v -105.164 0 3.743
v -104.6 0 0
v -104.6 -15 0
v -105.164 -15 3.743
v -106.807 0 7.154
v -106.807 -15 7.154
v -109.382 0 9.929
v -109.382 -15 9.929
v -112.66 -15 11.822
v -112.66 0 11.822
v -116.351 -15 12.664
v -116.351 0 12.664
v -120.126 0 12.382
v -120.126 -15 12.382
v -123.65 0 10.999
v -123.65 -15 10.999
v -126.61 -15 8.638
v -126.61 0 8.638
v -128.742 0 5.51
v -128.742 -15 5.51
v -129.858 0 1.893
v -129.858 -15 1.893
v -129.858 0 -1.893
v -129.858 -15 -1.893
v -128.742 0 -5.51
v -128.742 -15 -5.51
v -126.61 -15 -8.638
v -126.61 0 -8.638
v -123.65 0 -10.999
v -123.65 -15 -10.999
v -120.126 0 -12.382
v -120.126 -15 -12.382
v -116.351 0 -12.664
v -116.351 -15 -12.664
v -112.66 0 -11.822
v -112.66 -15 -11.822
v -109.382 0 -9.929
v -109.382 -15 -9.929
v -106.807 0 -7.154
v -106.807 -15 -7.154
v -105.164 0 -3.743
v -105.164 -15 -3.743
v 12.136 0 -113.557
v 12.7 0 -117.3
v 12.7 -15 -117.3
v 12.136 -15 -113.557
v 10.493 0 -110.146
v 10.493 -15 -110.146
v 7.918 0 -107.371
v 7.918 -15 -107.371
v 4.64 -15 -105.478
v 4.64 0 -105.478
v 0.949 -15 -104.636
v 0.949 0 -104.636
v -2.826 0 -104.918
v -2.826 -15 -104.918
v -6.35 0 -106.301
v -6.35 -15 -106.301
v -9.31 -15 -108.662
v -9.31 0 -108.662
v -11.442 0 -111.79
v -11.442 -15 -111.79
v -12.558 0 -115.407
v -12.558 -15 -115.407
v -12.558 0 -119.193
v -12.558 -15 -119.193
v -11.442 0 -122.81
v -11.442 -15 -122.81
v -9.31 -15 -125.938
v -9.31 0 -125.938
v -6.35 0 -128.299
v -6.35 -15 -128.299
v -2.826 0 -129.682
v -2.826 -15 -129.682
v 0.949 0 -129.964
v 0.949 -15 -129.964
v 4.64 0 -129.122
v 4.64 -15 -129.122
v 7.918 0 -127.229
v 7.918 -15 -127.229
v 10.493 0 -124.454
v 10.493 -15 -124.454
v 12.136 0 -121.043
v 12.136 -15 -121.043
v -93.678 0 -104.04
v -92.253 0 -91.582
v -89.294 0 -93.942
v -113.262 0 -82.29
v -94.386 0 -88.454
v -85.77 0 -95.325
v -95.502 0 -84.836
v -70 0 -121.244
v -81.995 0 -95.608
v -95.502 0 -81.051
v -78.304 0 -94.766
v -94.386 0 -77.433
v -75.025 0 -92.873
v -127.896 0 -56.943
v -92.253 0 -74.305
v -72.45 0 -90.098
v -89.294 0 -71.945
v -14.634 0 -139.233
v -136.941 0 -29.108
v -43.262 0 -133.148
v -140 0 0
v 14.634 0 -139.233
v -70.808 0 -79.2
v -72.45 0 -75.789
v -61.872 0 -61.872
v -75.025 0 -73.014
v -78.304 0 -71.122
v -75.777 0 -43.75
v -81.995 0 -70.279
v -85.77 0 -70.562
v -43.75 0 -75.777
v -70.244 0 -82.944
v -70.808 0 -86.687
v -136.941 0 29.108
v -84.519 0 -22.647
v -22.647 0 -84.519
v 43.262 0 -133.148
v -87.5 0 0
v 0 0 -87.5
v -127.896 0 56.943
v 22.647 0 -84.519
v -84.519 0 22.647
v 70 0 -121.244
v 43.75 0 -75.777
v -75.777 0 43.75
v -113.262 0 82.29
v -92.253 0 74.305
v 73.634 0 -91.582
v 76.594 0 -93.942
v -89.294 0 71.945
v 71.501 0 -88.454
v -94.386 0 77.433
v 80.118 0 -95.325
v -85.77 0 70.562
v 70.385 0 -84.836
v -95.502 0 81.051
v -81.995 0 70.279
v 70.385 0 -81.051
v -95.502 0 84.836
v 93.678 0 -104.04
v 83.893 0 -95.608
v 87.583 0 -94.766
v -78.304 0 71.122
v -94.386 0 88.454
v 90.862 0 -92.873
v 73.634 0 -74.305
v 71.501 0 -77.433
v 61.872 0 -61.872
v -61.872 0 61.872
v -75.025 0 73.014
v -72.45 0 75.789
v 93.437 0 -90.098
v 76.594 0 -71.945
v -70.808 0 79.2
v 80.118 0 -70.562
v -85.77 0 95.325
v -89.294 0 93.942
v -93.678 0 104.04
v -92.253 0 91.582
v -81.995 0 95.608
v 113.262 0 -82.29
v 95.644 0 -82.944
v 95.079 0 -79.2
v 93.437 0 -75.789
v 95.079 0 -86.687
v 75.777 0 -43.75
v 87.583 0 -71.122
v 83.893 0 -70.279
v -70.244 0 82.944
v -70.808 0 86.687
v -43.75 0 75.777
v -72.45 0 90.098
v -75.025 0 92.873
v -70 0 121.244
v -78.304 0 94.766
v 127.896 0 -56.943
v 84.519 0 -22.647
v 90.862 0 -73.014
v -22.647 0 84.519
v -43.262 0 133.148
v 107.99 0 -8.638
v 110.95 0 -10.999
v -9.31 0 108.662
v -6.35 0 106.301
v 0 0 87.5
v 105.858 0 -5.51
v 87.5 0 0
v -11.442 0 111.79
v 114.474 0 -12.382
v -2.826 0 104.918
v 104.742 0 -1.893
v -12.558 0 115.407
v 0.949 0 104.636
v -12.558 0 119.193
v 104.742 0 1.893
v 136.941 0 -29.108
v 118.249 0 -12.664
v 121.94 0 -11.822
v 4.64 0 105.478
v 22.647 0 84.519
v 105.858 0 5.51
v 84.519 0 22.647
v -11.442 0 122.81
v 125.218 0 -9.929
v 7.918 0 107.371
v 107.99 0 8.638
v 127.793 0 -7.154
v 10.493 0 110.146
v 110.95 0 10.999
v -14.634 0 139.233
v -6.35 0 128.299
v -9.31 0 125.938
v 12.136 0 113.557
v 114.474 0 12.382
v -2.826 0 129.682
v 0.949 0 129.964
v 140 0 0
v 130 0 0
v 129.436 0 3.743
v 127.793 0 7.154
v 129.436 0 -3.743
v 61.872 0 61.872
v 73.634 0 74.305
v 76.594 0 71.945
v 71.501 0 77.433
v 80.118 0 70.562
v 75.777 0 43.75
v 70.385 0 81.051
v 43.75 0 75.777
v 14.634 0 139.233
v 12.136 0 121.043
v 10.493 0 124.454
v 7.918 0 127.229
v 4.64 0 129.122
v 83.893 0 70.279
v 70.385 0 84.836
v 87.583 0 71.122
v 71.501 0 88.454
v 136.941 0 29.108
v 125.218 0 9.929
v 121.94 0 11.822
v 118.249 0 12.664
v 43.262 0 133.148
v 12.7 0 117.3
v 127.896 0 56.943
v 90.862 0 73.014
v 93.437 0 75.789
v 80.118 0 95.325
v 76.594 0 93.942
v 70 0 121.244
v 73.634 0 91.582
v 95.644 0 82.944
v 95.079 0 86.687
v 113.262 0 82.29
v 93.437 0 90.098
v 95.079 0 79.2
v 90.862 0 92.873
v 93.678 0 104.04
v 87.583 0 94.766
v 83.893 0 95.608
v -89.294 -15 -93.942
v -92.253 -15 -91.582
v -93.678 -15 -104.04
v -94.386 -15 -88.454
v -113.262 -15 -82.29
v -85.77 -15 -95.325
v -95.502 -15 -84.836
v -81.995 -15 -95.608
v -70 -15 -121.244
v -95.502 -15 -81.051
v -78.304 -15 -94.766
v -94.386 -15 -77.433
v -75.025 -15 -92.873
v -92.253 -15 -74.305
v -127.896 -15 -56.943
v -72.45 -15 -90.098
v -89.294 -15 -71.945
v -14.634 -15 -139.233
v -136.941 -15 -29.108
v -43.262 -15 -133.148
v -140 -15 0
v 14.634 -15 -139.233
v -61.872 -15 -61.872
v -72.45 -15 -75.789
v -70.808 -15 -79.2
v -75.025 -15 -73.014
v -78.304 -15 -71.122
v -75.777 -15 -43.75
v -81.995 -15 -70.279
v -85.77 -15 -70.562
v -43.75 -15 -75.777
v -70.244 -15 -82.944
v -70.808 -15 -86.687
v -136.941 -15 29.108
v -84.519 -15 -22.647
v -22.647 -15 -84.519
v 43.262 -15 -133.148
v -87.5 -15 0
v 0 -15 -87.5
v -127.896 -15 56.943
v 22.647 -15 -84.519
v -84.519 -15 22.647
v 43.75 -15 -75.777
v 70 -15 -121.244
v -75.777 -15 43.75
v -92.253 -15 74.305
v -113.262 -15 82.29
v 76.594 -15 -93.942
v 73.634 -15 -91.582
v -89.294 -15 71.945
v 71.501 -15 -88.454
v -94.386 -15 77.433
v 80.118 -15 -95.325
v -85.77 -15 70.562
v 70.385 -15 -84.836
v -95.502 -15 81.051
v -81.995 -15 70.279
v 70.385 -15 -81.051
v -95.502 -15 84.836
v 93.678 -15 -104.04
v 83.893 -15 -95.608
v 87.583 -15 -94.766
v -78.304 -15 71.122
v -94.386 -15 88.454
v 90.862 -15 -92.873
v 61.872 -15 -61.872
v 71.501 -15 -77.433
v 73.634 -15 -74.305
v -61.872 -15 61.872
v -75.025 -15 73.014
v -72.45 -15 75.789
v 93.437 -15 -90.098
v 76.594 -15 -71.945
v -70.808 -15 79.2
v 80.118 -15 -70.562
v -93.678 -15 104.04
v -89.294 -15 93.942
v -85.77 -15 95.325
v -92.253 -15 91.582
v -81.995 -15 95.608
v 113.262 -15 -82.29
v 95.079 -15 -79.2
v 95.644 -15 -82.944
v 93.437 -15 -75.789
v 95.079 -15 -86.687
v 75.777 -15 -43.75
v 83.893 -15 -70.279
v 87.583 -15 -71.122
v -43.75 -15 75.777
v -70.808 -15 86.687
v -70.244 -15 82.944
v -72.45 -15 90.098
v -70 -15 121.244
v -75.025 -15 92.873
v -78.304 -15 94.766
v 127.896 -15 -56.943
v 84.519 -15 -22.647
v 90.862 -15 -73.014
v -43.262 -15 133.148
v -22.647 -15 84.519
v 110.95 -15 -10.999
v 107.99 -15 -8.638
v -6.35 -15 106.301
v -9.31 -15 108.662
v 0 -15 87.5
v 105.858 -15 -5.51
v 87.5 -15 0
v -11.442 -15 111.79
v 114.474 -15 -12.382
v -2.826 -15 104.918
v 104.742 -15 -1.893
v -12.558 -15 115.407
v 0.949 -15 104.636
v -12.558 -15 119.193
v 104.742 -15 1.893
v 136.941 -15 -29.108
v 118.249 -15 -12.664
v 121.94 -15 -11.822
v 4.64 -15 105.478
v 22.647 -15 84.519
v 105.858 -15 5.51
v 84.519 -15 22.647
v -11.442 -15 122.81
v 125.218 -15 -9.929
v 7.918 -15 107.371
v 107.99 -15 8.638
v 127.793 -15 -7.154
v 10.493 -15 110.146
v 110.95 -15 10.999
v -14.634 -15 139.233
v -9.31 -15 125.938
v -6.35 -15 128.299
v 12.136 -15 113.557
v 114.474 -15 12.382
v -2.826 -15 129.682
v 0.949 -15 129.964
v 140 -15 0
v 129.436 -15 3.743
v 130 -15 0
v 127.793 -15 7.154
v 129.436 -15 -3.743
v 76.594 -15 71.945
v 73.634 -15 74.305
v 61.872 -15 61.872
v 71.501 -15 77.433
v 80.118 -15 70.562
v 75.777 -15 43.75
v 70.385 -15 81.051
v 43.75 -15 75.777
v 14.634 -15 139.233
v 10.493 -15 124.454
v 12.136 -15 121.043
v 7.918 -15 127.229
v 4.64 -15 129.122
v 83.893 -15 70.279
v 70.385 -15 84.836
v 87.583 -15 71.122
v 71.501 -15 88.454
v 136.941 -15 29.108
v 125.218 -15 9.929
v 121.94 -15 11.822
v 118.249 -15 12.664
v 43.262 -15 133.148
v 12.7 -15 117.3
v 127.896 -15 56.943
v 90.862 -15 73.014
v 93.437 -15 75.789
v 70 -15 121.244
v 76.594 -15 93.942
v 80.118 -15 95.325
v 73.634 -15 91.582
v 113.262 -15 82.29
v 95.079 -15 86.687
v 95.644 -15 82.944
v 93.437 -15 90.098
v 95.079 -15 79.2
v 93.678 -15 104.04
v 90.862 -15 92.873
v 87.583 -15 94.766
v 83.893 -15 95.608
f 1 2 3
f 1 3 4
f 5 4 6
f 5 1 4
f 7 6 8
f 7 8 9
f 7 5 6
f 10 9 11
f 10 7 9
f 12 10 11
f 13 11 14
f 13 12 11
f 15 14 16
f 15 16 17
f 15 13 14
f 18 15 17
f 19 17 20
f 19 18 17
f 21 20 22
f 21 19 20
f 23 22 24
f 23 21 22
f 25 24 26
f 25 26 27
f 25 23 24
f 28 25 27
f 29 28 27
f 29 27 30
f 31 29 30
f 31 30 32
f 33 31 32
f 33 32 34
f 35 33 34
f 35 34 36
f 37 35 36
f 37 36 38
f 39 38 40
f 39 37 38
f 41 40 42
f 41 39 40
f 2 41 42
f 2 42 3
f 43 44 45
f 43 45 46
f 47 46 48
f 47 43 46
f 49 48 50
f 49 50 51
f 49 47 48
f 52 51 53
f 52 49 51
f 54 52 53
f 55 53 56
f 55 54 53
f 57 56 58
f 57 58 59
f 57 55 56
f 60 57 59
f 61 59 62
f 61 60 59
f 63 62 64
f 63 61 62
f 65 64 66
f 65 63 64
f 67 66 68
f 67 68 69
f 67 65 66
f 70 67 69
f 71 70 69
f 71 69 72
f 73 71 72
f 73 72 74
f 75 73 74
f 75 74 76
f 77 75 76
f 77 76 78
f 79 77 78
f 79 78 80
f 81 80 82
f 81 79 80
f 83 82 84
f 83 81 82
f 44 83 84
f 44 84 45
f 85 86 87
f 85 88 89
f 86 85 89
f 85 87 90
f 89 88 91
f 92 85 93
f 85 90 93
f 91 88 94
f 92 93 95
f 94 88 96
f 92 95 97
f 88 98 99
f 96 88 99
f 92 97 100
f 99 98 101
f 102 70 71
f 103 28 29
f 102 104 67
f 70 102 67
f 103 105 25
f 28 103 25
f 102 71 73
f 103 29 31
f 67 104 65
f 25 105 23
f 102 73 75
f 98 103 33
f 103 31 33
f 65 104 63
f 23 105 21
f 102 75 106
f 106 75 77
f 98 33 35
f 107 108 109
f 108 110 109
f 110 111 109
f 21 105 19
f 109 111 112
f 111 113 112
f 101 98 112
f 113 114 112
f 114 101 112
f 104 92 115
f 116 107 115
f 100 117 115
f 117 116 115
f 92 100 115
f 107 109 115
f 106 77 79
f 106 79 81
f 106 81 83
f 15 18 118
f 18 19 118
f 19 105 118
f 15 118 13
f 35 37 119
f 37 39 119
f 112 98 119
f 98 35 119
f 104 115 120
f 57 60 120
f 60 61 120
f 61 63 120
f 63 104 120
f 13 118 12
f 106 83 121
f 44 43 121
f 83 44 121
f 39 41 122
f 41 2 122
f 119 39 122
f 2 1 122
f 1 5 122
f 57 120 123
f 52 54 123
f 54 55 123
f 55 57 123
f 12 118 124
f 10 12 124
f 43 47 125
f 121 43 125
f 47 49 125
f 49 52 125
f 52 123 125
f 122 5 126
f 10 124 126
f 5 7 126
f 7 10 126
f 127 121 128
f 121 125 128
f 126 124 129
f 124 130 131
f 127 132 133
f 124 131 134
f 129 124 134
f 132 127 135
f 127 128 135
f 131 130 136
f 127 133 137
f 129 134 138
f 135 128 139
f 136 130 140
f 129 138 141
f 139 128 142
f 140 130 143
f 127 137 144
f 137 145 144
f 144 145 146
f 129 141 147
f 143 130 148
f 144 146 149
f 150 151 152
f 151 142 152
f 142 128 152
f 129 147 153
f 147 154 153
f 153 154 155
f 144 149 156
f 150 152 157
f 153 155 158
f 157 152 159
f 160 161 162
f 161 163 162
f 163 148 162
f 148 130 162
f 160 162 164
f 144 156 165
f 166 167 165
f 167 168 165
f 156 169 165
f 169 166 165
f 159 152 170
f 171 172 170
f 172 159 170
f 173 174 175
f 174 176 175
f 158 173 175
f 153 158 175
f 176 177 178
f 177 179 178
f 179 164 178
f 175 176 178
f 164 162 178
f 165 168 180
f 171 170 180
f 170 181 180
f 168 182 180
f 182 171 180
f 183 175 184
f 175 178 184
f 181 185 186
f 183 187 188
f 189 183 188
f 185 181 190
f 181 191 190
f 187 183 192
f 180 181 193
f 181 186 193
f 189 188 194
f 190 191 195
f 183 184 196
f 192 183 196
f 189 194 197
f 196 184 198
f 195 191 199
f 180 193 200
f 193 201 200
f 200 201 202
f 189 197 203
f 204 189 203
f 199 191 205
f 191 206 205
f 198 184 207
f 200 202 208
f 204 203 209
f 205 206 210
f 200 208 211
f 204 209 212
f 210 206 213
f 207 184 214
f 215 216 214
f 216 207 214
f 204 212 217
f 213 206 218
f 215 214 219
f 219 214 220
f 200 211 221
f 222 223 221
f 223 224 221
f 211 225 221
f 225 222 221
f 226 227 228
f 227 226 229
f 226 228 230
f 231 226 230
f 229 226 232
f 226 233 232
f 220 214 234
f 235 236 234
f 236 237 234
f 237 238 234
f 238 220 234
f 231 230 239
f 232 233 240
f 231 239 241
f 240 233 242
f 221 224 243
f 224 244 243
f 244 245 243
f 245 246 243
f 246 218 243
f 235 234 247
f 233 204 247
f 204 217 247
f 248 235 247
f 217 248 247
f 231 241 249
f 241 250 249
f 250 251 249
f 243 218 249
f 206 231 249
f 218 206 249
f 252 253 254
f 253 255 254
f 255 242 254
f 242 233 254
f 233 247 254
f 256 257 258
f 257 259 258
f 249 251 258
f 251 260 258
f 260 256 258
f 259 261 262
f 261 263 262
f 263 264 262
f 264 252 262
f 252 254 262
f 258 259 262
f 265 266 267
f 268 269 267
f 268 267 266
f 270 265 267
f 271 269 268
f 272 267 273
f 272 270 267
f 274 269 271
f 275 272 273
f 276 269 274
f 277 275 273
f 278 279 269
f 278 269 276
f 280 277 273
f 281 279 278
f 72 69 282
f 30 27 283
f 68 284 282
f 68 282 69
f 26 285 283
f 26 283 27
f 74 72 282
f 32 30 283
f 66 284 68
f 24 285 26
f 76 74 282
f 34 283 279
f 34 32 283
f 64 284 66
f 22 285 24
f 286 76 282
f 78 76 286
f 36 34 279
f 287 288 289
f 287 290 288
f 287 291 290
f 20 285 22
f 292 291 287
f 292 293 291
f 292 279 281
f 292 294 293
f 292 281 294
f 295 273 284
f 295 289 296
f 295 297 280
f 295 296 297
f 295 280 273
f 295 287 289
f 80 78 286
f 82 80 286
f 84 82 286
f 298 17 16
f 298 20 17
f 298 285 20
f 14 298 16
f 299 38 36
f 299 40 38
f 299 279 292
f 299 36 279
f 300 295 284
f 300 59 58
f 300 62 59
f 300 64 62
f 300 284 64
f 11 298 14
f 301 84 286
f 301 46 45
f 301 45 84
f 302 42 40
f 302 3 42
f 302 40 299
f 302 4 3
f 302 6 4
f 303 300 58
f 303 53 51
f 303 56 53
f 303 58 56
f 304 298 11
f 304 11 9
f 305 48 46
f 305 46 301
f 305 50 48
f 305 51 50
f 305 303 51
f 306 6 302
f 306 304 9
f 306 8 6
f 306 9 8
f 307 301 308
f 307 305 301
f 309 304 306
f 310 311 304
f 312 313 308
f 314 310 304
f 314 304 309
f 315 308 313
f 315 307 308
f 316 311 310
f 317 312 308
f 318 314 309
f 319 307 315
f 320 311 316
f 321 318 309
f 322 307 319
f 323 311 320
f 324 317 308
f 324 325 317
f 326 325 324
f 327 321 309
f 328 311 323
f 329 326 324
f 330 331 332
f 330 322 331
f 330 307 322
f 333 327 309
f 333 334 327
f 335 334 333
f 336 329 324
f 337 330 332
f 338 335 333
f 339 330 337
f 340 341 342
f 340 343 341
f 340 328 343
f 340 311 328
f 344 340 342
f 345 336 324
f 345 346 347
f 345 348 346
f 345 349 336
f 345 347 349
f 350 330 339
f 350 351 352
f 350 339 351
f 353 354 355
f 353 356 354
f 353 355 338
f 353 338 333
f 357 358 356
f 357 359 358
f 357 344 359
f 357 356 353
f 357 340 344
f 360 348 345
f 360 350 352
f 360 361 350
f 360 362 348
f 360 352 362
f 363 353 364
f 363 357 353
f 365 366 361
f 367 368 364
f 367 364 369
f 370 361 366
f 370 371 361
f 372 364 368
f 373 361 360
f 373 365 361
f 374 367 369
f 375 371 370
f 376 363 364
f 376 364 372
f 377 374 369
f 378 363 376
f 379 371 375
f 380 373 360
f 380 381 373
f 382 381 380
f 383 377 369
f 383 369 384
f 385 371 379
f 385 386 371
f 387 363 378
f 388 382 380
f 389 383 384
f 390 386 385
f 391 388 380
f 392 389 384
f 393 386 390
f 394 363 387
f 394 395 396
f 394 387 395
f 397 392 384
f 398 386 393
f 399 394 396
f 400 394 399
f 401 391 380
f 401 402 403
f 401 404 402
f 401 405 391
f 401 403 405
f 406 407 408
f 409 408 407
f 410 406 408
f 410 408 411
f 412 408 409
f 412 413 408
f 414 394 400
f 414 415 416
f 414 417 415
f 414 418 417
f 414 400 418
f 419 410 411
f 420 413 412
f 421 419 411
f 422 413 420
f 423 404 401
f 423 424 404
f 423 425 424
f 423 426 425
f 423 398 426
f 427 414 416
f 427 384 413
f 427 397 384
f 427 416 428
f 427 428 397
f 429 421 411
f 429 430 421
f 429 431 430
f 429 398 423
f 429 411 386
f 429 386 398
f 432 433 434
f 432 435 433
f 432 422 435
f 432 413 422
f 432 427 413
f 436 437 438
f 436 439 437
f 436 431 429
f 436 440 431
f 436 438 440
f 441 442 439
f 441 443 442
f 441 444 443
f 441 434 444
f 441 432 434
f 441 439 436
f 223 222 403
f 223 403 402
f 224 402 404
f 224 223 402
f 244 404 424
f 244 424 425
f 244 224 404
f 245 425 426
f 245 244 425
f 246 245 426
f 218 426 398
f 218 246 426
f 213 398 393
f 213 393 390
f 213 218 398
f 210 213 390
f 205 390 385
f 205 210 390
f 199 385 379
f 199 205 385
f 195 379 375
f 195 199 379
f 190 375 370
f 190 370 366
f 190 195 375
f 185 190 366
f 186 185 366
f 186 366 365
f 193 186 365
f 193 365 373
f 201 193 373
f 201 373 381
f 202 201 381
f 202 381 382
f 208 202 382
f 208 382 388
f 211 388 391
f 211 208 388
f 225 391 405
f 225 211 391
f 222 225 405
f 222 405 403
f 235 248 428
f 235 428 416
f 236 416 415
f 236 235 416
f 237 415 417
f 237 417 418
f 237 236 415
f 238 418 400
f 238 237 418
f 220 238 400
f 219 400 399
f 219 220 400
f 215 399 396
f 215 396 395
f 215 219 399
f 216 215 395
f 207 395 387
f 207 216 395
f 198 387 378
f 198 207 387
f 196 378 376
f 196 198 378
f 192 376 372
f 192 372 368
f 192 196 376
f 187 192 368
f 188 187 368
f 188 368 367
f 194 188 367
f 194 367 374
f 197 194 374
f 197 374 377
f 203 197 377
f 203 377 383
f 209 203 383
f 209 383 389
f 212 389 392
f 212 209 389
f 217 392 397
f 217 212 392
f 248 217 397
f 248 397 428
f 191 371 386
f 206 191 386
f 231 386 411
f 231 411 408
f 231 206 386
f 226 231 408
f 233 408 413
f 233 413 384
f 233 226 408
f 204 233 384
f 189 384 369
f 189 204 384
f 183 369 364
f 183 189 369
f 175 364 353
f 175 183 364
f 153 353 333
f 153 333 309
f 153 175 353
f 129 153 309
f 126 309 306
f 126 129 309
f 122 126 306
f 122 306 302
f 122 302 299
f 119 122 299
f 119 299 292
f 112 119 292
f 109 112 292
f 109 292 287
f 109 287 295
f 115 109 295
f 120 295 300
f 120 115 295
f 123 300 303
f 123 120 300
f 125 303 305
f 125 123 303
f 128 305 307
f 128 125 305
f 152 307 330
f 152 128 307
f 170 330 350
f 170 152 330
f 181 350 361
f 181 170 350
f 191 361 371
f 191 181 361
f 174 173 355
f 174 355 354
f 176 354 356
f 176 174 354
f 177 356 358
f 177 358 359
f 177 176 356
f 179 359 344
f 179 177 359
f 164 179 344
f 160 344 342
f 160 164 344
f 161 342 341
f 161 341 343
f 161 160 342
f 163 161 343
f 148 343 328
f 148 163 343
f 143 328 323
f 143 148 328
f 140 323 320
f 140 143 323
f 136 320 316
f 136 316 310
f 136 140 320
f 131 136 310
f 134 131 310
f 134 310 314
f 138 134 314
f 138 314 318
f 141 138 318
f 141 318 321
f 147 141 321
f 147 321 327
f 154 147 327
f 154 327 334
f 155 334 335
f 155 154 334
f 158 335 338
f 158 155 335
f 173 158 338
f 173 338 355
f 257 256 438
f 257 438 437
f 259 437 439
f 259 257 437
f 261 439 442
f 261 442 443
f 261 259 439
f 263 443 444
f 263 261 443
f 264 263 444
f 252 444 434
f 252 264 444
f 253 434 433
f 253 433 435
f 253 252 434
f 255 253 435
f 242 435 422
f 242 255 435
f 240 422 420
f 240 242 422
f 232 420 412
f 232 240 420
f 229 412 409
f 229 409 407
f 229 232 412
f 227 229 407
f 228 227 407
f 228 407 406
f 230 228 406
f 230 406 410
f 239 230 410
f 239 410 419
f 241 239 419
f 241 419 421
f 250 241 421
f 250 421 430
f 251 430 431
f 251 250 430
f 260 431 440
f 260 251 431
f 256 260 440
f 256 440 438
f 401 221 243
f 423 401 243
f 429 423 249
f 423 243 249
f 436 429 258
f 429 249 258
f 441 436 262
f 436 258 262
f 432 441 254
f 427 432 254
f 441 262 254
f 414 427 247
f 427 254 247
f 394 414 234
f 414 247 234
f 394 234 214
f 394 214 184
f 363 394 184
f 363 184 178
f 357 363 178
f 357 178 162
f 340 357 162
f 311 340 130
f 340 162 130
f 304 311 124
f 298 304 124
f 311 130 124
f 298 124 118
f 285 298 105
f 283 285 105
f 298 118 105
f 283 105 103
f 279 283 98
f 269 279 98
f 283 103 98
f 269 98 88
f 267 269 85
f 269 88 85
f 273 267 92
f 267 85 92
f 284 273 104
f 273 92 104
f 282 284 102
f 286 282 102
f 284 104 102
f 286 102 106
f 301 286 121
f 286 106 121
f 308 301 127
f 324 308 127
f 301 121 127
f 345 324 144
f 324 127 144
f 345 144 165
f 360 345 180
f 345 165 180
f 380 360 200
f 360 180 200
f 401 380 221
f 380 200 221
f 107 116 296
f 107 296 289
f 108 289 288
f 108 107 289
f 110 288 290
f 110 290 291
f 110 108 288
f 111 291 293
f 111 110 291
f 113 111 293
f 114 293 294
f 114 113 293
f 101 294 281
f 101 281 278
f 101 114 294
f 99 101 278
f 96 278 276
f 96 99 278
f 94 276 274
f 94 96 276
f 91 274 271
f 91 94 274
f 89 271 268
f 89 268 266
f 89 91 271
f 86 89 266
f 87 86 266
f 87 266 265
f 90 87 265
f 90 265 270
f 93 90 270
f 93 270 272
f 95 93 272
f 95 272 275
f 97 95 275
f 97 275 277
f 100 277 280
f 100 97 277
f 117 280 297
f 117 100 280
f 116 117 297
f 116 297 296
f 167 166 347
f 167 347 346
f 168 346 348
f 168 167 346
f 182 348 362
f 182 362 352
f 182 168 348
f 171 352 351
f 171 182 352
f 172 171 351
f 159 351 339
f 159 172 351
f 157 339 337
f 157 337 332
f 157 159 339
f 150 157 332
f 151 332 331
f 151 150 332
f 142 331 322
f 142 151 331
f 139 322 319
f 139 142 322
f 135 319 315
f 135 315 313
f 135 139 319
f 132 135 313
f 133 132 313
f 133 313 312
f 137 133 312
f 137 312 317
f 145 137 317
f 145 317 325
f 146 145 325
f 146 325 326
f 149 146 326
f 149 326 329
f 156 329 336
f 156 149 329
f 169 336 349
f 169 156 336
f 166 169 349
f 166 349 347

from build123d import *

# Parameters (mm, degrees)
F0_R     = 140
F0_R_2   = 12.7
F0_R_3   = 87.5
F1_DEPTH = 15


with BuildPart() as f1:
    # F0 (on Front) → F1 (new body)
    with BuildSketch(Plane.XZ):
        Circle(F0_R)
        with Locations((-82.943625, -82.943625)):
            Circle(F0_R_2, mode=Mode.SUBTRACT)
        with Locations((0, -117.3)):
            Circle(F0_R_2, mode=Mode.SUBTRACT)
        with Locations((82.943625, -82.943625)):
            Circle(F0_R_2, mode=Mode.SUBTRACT)
        with Locations((-117.3, 0)):
            Circle(F0_R_2, mode=Mode.SUBTRACT)
        with Locations((-82.943625, 82.943625)):
            Circle(F0_R_2, mode=Mode.SUBTRACT)
        Circle(F0_R_3, mode=Mode.SUBTRACT)
        with Locations((117.3, 0)):
            Circle(F0_R_2, mode=Mode.SUBTRACT)
        with Locations((0, 117.3)):
            Circle(F0_R_2, mode=Mode.SUBTRACT)
        with Locations((82.943625, 82.943625)):
            Circle(F0_R_2, mode=Mode.SUBTRACT)
    extrude(amount=F1_DEPTH)


solid = f1.part
